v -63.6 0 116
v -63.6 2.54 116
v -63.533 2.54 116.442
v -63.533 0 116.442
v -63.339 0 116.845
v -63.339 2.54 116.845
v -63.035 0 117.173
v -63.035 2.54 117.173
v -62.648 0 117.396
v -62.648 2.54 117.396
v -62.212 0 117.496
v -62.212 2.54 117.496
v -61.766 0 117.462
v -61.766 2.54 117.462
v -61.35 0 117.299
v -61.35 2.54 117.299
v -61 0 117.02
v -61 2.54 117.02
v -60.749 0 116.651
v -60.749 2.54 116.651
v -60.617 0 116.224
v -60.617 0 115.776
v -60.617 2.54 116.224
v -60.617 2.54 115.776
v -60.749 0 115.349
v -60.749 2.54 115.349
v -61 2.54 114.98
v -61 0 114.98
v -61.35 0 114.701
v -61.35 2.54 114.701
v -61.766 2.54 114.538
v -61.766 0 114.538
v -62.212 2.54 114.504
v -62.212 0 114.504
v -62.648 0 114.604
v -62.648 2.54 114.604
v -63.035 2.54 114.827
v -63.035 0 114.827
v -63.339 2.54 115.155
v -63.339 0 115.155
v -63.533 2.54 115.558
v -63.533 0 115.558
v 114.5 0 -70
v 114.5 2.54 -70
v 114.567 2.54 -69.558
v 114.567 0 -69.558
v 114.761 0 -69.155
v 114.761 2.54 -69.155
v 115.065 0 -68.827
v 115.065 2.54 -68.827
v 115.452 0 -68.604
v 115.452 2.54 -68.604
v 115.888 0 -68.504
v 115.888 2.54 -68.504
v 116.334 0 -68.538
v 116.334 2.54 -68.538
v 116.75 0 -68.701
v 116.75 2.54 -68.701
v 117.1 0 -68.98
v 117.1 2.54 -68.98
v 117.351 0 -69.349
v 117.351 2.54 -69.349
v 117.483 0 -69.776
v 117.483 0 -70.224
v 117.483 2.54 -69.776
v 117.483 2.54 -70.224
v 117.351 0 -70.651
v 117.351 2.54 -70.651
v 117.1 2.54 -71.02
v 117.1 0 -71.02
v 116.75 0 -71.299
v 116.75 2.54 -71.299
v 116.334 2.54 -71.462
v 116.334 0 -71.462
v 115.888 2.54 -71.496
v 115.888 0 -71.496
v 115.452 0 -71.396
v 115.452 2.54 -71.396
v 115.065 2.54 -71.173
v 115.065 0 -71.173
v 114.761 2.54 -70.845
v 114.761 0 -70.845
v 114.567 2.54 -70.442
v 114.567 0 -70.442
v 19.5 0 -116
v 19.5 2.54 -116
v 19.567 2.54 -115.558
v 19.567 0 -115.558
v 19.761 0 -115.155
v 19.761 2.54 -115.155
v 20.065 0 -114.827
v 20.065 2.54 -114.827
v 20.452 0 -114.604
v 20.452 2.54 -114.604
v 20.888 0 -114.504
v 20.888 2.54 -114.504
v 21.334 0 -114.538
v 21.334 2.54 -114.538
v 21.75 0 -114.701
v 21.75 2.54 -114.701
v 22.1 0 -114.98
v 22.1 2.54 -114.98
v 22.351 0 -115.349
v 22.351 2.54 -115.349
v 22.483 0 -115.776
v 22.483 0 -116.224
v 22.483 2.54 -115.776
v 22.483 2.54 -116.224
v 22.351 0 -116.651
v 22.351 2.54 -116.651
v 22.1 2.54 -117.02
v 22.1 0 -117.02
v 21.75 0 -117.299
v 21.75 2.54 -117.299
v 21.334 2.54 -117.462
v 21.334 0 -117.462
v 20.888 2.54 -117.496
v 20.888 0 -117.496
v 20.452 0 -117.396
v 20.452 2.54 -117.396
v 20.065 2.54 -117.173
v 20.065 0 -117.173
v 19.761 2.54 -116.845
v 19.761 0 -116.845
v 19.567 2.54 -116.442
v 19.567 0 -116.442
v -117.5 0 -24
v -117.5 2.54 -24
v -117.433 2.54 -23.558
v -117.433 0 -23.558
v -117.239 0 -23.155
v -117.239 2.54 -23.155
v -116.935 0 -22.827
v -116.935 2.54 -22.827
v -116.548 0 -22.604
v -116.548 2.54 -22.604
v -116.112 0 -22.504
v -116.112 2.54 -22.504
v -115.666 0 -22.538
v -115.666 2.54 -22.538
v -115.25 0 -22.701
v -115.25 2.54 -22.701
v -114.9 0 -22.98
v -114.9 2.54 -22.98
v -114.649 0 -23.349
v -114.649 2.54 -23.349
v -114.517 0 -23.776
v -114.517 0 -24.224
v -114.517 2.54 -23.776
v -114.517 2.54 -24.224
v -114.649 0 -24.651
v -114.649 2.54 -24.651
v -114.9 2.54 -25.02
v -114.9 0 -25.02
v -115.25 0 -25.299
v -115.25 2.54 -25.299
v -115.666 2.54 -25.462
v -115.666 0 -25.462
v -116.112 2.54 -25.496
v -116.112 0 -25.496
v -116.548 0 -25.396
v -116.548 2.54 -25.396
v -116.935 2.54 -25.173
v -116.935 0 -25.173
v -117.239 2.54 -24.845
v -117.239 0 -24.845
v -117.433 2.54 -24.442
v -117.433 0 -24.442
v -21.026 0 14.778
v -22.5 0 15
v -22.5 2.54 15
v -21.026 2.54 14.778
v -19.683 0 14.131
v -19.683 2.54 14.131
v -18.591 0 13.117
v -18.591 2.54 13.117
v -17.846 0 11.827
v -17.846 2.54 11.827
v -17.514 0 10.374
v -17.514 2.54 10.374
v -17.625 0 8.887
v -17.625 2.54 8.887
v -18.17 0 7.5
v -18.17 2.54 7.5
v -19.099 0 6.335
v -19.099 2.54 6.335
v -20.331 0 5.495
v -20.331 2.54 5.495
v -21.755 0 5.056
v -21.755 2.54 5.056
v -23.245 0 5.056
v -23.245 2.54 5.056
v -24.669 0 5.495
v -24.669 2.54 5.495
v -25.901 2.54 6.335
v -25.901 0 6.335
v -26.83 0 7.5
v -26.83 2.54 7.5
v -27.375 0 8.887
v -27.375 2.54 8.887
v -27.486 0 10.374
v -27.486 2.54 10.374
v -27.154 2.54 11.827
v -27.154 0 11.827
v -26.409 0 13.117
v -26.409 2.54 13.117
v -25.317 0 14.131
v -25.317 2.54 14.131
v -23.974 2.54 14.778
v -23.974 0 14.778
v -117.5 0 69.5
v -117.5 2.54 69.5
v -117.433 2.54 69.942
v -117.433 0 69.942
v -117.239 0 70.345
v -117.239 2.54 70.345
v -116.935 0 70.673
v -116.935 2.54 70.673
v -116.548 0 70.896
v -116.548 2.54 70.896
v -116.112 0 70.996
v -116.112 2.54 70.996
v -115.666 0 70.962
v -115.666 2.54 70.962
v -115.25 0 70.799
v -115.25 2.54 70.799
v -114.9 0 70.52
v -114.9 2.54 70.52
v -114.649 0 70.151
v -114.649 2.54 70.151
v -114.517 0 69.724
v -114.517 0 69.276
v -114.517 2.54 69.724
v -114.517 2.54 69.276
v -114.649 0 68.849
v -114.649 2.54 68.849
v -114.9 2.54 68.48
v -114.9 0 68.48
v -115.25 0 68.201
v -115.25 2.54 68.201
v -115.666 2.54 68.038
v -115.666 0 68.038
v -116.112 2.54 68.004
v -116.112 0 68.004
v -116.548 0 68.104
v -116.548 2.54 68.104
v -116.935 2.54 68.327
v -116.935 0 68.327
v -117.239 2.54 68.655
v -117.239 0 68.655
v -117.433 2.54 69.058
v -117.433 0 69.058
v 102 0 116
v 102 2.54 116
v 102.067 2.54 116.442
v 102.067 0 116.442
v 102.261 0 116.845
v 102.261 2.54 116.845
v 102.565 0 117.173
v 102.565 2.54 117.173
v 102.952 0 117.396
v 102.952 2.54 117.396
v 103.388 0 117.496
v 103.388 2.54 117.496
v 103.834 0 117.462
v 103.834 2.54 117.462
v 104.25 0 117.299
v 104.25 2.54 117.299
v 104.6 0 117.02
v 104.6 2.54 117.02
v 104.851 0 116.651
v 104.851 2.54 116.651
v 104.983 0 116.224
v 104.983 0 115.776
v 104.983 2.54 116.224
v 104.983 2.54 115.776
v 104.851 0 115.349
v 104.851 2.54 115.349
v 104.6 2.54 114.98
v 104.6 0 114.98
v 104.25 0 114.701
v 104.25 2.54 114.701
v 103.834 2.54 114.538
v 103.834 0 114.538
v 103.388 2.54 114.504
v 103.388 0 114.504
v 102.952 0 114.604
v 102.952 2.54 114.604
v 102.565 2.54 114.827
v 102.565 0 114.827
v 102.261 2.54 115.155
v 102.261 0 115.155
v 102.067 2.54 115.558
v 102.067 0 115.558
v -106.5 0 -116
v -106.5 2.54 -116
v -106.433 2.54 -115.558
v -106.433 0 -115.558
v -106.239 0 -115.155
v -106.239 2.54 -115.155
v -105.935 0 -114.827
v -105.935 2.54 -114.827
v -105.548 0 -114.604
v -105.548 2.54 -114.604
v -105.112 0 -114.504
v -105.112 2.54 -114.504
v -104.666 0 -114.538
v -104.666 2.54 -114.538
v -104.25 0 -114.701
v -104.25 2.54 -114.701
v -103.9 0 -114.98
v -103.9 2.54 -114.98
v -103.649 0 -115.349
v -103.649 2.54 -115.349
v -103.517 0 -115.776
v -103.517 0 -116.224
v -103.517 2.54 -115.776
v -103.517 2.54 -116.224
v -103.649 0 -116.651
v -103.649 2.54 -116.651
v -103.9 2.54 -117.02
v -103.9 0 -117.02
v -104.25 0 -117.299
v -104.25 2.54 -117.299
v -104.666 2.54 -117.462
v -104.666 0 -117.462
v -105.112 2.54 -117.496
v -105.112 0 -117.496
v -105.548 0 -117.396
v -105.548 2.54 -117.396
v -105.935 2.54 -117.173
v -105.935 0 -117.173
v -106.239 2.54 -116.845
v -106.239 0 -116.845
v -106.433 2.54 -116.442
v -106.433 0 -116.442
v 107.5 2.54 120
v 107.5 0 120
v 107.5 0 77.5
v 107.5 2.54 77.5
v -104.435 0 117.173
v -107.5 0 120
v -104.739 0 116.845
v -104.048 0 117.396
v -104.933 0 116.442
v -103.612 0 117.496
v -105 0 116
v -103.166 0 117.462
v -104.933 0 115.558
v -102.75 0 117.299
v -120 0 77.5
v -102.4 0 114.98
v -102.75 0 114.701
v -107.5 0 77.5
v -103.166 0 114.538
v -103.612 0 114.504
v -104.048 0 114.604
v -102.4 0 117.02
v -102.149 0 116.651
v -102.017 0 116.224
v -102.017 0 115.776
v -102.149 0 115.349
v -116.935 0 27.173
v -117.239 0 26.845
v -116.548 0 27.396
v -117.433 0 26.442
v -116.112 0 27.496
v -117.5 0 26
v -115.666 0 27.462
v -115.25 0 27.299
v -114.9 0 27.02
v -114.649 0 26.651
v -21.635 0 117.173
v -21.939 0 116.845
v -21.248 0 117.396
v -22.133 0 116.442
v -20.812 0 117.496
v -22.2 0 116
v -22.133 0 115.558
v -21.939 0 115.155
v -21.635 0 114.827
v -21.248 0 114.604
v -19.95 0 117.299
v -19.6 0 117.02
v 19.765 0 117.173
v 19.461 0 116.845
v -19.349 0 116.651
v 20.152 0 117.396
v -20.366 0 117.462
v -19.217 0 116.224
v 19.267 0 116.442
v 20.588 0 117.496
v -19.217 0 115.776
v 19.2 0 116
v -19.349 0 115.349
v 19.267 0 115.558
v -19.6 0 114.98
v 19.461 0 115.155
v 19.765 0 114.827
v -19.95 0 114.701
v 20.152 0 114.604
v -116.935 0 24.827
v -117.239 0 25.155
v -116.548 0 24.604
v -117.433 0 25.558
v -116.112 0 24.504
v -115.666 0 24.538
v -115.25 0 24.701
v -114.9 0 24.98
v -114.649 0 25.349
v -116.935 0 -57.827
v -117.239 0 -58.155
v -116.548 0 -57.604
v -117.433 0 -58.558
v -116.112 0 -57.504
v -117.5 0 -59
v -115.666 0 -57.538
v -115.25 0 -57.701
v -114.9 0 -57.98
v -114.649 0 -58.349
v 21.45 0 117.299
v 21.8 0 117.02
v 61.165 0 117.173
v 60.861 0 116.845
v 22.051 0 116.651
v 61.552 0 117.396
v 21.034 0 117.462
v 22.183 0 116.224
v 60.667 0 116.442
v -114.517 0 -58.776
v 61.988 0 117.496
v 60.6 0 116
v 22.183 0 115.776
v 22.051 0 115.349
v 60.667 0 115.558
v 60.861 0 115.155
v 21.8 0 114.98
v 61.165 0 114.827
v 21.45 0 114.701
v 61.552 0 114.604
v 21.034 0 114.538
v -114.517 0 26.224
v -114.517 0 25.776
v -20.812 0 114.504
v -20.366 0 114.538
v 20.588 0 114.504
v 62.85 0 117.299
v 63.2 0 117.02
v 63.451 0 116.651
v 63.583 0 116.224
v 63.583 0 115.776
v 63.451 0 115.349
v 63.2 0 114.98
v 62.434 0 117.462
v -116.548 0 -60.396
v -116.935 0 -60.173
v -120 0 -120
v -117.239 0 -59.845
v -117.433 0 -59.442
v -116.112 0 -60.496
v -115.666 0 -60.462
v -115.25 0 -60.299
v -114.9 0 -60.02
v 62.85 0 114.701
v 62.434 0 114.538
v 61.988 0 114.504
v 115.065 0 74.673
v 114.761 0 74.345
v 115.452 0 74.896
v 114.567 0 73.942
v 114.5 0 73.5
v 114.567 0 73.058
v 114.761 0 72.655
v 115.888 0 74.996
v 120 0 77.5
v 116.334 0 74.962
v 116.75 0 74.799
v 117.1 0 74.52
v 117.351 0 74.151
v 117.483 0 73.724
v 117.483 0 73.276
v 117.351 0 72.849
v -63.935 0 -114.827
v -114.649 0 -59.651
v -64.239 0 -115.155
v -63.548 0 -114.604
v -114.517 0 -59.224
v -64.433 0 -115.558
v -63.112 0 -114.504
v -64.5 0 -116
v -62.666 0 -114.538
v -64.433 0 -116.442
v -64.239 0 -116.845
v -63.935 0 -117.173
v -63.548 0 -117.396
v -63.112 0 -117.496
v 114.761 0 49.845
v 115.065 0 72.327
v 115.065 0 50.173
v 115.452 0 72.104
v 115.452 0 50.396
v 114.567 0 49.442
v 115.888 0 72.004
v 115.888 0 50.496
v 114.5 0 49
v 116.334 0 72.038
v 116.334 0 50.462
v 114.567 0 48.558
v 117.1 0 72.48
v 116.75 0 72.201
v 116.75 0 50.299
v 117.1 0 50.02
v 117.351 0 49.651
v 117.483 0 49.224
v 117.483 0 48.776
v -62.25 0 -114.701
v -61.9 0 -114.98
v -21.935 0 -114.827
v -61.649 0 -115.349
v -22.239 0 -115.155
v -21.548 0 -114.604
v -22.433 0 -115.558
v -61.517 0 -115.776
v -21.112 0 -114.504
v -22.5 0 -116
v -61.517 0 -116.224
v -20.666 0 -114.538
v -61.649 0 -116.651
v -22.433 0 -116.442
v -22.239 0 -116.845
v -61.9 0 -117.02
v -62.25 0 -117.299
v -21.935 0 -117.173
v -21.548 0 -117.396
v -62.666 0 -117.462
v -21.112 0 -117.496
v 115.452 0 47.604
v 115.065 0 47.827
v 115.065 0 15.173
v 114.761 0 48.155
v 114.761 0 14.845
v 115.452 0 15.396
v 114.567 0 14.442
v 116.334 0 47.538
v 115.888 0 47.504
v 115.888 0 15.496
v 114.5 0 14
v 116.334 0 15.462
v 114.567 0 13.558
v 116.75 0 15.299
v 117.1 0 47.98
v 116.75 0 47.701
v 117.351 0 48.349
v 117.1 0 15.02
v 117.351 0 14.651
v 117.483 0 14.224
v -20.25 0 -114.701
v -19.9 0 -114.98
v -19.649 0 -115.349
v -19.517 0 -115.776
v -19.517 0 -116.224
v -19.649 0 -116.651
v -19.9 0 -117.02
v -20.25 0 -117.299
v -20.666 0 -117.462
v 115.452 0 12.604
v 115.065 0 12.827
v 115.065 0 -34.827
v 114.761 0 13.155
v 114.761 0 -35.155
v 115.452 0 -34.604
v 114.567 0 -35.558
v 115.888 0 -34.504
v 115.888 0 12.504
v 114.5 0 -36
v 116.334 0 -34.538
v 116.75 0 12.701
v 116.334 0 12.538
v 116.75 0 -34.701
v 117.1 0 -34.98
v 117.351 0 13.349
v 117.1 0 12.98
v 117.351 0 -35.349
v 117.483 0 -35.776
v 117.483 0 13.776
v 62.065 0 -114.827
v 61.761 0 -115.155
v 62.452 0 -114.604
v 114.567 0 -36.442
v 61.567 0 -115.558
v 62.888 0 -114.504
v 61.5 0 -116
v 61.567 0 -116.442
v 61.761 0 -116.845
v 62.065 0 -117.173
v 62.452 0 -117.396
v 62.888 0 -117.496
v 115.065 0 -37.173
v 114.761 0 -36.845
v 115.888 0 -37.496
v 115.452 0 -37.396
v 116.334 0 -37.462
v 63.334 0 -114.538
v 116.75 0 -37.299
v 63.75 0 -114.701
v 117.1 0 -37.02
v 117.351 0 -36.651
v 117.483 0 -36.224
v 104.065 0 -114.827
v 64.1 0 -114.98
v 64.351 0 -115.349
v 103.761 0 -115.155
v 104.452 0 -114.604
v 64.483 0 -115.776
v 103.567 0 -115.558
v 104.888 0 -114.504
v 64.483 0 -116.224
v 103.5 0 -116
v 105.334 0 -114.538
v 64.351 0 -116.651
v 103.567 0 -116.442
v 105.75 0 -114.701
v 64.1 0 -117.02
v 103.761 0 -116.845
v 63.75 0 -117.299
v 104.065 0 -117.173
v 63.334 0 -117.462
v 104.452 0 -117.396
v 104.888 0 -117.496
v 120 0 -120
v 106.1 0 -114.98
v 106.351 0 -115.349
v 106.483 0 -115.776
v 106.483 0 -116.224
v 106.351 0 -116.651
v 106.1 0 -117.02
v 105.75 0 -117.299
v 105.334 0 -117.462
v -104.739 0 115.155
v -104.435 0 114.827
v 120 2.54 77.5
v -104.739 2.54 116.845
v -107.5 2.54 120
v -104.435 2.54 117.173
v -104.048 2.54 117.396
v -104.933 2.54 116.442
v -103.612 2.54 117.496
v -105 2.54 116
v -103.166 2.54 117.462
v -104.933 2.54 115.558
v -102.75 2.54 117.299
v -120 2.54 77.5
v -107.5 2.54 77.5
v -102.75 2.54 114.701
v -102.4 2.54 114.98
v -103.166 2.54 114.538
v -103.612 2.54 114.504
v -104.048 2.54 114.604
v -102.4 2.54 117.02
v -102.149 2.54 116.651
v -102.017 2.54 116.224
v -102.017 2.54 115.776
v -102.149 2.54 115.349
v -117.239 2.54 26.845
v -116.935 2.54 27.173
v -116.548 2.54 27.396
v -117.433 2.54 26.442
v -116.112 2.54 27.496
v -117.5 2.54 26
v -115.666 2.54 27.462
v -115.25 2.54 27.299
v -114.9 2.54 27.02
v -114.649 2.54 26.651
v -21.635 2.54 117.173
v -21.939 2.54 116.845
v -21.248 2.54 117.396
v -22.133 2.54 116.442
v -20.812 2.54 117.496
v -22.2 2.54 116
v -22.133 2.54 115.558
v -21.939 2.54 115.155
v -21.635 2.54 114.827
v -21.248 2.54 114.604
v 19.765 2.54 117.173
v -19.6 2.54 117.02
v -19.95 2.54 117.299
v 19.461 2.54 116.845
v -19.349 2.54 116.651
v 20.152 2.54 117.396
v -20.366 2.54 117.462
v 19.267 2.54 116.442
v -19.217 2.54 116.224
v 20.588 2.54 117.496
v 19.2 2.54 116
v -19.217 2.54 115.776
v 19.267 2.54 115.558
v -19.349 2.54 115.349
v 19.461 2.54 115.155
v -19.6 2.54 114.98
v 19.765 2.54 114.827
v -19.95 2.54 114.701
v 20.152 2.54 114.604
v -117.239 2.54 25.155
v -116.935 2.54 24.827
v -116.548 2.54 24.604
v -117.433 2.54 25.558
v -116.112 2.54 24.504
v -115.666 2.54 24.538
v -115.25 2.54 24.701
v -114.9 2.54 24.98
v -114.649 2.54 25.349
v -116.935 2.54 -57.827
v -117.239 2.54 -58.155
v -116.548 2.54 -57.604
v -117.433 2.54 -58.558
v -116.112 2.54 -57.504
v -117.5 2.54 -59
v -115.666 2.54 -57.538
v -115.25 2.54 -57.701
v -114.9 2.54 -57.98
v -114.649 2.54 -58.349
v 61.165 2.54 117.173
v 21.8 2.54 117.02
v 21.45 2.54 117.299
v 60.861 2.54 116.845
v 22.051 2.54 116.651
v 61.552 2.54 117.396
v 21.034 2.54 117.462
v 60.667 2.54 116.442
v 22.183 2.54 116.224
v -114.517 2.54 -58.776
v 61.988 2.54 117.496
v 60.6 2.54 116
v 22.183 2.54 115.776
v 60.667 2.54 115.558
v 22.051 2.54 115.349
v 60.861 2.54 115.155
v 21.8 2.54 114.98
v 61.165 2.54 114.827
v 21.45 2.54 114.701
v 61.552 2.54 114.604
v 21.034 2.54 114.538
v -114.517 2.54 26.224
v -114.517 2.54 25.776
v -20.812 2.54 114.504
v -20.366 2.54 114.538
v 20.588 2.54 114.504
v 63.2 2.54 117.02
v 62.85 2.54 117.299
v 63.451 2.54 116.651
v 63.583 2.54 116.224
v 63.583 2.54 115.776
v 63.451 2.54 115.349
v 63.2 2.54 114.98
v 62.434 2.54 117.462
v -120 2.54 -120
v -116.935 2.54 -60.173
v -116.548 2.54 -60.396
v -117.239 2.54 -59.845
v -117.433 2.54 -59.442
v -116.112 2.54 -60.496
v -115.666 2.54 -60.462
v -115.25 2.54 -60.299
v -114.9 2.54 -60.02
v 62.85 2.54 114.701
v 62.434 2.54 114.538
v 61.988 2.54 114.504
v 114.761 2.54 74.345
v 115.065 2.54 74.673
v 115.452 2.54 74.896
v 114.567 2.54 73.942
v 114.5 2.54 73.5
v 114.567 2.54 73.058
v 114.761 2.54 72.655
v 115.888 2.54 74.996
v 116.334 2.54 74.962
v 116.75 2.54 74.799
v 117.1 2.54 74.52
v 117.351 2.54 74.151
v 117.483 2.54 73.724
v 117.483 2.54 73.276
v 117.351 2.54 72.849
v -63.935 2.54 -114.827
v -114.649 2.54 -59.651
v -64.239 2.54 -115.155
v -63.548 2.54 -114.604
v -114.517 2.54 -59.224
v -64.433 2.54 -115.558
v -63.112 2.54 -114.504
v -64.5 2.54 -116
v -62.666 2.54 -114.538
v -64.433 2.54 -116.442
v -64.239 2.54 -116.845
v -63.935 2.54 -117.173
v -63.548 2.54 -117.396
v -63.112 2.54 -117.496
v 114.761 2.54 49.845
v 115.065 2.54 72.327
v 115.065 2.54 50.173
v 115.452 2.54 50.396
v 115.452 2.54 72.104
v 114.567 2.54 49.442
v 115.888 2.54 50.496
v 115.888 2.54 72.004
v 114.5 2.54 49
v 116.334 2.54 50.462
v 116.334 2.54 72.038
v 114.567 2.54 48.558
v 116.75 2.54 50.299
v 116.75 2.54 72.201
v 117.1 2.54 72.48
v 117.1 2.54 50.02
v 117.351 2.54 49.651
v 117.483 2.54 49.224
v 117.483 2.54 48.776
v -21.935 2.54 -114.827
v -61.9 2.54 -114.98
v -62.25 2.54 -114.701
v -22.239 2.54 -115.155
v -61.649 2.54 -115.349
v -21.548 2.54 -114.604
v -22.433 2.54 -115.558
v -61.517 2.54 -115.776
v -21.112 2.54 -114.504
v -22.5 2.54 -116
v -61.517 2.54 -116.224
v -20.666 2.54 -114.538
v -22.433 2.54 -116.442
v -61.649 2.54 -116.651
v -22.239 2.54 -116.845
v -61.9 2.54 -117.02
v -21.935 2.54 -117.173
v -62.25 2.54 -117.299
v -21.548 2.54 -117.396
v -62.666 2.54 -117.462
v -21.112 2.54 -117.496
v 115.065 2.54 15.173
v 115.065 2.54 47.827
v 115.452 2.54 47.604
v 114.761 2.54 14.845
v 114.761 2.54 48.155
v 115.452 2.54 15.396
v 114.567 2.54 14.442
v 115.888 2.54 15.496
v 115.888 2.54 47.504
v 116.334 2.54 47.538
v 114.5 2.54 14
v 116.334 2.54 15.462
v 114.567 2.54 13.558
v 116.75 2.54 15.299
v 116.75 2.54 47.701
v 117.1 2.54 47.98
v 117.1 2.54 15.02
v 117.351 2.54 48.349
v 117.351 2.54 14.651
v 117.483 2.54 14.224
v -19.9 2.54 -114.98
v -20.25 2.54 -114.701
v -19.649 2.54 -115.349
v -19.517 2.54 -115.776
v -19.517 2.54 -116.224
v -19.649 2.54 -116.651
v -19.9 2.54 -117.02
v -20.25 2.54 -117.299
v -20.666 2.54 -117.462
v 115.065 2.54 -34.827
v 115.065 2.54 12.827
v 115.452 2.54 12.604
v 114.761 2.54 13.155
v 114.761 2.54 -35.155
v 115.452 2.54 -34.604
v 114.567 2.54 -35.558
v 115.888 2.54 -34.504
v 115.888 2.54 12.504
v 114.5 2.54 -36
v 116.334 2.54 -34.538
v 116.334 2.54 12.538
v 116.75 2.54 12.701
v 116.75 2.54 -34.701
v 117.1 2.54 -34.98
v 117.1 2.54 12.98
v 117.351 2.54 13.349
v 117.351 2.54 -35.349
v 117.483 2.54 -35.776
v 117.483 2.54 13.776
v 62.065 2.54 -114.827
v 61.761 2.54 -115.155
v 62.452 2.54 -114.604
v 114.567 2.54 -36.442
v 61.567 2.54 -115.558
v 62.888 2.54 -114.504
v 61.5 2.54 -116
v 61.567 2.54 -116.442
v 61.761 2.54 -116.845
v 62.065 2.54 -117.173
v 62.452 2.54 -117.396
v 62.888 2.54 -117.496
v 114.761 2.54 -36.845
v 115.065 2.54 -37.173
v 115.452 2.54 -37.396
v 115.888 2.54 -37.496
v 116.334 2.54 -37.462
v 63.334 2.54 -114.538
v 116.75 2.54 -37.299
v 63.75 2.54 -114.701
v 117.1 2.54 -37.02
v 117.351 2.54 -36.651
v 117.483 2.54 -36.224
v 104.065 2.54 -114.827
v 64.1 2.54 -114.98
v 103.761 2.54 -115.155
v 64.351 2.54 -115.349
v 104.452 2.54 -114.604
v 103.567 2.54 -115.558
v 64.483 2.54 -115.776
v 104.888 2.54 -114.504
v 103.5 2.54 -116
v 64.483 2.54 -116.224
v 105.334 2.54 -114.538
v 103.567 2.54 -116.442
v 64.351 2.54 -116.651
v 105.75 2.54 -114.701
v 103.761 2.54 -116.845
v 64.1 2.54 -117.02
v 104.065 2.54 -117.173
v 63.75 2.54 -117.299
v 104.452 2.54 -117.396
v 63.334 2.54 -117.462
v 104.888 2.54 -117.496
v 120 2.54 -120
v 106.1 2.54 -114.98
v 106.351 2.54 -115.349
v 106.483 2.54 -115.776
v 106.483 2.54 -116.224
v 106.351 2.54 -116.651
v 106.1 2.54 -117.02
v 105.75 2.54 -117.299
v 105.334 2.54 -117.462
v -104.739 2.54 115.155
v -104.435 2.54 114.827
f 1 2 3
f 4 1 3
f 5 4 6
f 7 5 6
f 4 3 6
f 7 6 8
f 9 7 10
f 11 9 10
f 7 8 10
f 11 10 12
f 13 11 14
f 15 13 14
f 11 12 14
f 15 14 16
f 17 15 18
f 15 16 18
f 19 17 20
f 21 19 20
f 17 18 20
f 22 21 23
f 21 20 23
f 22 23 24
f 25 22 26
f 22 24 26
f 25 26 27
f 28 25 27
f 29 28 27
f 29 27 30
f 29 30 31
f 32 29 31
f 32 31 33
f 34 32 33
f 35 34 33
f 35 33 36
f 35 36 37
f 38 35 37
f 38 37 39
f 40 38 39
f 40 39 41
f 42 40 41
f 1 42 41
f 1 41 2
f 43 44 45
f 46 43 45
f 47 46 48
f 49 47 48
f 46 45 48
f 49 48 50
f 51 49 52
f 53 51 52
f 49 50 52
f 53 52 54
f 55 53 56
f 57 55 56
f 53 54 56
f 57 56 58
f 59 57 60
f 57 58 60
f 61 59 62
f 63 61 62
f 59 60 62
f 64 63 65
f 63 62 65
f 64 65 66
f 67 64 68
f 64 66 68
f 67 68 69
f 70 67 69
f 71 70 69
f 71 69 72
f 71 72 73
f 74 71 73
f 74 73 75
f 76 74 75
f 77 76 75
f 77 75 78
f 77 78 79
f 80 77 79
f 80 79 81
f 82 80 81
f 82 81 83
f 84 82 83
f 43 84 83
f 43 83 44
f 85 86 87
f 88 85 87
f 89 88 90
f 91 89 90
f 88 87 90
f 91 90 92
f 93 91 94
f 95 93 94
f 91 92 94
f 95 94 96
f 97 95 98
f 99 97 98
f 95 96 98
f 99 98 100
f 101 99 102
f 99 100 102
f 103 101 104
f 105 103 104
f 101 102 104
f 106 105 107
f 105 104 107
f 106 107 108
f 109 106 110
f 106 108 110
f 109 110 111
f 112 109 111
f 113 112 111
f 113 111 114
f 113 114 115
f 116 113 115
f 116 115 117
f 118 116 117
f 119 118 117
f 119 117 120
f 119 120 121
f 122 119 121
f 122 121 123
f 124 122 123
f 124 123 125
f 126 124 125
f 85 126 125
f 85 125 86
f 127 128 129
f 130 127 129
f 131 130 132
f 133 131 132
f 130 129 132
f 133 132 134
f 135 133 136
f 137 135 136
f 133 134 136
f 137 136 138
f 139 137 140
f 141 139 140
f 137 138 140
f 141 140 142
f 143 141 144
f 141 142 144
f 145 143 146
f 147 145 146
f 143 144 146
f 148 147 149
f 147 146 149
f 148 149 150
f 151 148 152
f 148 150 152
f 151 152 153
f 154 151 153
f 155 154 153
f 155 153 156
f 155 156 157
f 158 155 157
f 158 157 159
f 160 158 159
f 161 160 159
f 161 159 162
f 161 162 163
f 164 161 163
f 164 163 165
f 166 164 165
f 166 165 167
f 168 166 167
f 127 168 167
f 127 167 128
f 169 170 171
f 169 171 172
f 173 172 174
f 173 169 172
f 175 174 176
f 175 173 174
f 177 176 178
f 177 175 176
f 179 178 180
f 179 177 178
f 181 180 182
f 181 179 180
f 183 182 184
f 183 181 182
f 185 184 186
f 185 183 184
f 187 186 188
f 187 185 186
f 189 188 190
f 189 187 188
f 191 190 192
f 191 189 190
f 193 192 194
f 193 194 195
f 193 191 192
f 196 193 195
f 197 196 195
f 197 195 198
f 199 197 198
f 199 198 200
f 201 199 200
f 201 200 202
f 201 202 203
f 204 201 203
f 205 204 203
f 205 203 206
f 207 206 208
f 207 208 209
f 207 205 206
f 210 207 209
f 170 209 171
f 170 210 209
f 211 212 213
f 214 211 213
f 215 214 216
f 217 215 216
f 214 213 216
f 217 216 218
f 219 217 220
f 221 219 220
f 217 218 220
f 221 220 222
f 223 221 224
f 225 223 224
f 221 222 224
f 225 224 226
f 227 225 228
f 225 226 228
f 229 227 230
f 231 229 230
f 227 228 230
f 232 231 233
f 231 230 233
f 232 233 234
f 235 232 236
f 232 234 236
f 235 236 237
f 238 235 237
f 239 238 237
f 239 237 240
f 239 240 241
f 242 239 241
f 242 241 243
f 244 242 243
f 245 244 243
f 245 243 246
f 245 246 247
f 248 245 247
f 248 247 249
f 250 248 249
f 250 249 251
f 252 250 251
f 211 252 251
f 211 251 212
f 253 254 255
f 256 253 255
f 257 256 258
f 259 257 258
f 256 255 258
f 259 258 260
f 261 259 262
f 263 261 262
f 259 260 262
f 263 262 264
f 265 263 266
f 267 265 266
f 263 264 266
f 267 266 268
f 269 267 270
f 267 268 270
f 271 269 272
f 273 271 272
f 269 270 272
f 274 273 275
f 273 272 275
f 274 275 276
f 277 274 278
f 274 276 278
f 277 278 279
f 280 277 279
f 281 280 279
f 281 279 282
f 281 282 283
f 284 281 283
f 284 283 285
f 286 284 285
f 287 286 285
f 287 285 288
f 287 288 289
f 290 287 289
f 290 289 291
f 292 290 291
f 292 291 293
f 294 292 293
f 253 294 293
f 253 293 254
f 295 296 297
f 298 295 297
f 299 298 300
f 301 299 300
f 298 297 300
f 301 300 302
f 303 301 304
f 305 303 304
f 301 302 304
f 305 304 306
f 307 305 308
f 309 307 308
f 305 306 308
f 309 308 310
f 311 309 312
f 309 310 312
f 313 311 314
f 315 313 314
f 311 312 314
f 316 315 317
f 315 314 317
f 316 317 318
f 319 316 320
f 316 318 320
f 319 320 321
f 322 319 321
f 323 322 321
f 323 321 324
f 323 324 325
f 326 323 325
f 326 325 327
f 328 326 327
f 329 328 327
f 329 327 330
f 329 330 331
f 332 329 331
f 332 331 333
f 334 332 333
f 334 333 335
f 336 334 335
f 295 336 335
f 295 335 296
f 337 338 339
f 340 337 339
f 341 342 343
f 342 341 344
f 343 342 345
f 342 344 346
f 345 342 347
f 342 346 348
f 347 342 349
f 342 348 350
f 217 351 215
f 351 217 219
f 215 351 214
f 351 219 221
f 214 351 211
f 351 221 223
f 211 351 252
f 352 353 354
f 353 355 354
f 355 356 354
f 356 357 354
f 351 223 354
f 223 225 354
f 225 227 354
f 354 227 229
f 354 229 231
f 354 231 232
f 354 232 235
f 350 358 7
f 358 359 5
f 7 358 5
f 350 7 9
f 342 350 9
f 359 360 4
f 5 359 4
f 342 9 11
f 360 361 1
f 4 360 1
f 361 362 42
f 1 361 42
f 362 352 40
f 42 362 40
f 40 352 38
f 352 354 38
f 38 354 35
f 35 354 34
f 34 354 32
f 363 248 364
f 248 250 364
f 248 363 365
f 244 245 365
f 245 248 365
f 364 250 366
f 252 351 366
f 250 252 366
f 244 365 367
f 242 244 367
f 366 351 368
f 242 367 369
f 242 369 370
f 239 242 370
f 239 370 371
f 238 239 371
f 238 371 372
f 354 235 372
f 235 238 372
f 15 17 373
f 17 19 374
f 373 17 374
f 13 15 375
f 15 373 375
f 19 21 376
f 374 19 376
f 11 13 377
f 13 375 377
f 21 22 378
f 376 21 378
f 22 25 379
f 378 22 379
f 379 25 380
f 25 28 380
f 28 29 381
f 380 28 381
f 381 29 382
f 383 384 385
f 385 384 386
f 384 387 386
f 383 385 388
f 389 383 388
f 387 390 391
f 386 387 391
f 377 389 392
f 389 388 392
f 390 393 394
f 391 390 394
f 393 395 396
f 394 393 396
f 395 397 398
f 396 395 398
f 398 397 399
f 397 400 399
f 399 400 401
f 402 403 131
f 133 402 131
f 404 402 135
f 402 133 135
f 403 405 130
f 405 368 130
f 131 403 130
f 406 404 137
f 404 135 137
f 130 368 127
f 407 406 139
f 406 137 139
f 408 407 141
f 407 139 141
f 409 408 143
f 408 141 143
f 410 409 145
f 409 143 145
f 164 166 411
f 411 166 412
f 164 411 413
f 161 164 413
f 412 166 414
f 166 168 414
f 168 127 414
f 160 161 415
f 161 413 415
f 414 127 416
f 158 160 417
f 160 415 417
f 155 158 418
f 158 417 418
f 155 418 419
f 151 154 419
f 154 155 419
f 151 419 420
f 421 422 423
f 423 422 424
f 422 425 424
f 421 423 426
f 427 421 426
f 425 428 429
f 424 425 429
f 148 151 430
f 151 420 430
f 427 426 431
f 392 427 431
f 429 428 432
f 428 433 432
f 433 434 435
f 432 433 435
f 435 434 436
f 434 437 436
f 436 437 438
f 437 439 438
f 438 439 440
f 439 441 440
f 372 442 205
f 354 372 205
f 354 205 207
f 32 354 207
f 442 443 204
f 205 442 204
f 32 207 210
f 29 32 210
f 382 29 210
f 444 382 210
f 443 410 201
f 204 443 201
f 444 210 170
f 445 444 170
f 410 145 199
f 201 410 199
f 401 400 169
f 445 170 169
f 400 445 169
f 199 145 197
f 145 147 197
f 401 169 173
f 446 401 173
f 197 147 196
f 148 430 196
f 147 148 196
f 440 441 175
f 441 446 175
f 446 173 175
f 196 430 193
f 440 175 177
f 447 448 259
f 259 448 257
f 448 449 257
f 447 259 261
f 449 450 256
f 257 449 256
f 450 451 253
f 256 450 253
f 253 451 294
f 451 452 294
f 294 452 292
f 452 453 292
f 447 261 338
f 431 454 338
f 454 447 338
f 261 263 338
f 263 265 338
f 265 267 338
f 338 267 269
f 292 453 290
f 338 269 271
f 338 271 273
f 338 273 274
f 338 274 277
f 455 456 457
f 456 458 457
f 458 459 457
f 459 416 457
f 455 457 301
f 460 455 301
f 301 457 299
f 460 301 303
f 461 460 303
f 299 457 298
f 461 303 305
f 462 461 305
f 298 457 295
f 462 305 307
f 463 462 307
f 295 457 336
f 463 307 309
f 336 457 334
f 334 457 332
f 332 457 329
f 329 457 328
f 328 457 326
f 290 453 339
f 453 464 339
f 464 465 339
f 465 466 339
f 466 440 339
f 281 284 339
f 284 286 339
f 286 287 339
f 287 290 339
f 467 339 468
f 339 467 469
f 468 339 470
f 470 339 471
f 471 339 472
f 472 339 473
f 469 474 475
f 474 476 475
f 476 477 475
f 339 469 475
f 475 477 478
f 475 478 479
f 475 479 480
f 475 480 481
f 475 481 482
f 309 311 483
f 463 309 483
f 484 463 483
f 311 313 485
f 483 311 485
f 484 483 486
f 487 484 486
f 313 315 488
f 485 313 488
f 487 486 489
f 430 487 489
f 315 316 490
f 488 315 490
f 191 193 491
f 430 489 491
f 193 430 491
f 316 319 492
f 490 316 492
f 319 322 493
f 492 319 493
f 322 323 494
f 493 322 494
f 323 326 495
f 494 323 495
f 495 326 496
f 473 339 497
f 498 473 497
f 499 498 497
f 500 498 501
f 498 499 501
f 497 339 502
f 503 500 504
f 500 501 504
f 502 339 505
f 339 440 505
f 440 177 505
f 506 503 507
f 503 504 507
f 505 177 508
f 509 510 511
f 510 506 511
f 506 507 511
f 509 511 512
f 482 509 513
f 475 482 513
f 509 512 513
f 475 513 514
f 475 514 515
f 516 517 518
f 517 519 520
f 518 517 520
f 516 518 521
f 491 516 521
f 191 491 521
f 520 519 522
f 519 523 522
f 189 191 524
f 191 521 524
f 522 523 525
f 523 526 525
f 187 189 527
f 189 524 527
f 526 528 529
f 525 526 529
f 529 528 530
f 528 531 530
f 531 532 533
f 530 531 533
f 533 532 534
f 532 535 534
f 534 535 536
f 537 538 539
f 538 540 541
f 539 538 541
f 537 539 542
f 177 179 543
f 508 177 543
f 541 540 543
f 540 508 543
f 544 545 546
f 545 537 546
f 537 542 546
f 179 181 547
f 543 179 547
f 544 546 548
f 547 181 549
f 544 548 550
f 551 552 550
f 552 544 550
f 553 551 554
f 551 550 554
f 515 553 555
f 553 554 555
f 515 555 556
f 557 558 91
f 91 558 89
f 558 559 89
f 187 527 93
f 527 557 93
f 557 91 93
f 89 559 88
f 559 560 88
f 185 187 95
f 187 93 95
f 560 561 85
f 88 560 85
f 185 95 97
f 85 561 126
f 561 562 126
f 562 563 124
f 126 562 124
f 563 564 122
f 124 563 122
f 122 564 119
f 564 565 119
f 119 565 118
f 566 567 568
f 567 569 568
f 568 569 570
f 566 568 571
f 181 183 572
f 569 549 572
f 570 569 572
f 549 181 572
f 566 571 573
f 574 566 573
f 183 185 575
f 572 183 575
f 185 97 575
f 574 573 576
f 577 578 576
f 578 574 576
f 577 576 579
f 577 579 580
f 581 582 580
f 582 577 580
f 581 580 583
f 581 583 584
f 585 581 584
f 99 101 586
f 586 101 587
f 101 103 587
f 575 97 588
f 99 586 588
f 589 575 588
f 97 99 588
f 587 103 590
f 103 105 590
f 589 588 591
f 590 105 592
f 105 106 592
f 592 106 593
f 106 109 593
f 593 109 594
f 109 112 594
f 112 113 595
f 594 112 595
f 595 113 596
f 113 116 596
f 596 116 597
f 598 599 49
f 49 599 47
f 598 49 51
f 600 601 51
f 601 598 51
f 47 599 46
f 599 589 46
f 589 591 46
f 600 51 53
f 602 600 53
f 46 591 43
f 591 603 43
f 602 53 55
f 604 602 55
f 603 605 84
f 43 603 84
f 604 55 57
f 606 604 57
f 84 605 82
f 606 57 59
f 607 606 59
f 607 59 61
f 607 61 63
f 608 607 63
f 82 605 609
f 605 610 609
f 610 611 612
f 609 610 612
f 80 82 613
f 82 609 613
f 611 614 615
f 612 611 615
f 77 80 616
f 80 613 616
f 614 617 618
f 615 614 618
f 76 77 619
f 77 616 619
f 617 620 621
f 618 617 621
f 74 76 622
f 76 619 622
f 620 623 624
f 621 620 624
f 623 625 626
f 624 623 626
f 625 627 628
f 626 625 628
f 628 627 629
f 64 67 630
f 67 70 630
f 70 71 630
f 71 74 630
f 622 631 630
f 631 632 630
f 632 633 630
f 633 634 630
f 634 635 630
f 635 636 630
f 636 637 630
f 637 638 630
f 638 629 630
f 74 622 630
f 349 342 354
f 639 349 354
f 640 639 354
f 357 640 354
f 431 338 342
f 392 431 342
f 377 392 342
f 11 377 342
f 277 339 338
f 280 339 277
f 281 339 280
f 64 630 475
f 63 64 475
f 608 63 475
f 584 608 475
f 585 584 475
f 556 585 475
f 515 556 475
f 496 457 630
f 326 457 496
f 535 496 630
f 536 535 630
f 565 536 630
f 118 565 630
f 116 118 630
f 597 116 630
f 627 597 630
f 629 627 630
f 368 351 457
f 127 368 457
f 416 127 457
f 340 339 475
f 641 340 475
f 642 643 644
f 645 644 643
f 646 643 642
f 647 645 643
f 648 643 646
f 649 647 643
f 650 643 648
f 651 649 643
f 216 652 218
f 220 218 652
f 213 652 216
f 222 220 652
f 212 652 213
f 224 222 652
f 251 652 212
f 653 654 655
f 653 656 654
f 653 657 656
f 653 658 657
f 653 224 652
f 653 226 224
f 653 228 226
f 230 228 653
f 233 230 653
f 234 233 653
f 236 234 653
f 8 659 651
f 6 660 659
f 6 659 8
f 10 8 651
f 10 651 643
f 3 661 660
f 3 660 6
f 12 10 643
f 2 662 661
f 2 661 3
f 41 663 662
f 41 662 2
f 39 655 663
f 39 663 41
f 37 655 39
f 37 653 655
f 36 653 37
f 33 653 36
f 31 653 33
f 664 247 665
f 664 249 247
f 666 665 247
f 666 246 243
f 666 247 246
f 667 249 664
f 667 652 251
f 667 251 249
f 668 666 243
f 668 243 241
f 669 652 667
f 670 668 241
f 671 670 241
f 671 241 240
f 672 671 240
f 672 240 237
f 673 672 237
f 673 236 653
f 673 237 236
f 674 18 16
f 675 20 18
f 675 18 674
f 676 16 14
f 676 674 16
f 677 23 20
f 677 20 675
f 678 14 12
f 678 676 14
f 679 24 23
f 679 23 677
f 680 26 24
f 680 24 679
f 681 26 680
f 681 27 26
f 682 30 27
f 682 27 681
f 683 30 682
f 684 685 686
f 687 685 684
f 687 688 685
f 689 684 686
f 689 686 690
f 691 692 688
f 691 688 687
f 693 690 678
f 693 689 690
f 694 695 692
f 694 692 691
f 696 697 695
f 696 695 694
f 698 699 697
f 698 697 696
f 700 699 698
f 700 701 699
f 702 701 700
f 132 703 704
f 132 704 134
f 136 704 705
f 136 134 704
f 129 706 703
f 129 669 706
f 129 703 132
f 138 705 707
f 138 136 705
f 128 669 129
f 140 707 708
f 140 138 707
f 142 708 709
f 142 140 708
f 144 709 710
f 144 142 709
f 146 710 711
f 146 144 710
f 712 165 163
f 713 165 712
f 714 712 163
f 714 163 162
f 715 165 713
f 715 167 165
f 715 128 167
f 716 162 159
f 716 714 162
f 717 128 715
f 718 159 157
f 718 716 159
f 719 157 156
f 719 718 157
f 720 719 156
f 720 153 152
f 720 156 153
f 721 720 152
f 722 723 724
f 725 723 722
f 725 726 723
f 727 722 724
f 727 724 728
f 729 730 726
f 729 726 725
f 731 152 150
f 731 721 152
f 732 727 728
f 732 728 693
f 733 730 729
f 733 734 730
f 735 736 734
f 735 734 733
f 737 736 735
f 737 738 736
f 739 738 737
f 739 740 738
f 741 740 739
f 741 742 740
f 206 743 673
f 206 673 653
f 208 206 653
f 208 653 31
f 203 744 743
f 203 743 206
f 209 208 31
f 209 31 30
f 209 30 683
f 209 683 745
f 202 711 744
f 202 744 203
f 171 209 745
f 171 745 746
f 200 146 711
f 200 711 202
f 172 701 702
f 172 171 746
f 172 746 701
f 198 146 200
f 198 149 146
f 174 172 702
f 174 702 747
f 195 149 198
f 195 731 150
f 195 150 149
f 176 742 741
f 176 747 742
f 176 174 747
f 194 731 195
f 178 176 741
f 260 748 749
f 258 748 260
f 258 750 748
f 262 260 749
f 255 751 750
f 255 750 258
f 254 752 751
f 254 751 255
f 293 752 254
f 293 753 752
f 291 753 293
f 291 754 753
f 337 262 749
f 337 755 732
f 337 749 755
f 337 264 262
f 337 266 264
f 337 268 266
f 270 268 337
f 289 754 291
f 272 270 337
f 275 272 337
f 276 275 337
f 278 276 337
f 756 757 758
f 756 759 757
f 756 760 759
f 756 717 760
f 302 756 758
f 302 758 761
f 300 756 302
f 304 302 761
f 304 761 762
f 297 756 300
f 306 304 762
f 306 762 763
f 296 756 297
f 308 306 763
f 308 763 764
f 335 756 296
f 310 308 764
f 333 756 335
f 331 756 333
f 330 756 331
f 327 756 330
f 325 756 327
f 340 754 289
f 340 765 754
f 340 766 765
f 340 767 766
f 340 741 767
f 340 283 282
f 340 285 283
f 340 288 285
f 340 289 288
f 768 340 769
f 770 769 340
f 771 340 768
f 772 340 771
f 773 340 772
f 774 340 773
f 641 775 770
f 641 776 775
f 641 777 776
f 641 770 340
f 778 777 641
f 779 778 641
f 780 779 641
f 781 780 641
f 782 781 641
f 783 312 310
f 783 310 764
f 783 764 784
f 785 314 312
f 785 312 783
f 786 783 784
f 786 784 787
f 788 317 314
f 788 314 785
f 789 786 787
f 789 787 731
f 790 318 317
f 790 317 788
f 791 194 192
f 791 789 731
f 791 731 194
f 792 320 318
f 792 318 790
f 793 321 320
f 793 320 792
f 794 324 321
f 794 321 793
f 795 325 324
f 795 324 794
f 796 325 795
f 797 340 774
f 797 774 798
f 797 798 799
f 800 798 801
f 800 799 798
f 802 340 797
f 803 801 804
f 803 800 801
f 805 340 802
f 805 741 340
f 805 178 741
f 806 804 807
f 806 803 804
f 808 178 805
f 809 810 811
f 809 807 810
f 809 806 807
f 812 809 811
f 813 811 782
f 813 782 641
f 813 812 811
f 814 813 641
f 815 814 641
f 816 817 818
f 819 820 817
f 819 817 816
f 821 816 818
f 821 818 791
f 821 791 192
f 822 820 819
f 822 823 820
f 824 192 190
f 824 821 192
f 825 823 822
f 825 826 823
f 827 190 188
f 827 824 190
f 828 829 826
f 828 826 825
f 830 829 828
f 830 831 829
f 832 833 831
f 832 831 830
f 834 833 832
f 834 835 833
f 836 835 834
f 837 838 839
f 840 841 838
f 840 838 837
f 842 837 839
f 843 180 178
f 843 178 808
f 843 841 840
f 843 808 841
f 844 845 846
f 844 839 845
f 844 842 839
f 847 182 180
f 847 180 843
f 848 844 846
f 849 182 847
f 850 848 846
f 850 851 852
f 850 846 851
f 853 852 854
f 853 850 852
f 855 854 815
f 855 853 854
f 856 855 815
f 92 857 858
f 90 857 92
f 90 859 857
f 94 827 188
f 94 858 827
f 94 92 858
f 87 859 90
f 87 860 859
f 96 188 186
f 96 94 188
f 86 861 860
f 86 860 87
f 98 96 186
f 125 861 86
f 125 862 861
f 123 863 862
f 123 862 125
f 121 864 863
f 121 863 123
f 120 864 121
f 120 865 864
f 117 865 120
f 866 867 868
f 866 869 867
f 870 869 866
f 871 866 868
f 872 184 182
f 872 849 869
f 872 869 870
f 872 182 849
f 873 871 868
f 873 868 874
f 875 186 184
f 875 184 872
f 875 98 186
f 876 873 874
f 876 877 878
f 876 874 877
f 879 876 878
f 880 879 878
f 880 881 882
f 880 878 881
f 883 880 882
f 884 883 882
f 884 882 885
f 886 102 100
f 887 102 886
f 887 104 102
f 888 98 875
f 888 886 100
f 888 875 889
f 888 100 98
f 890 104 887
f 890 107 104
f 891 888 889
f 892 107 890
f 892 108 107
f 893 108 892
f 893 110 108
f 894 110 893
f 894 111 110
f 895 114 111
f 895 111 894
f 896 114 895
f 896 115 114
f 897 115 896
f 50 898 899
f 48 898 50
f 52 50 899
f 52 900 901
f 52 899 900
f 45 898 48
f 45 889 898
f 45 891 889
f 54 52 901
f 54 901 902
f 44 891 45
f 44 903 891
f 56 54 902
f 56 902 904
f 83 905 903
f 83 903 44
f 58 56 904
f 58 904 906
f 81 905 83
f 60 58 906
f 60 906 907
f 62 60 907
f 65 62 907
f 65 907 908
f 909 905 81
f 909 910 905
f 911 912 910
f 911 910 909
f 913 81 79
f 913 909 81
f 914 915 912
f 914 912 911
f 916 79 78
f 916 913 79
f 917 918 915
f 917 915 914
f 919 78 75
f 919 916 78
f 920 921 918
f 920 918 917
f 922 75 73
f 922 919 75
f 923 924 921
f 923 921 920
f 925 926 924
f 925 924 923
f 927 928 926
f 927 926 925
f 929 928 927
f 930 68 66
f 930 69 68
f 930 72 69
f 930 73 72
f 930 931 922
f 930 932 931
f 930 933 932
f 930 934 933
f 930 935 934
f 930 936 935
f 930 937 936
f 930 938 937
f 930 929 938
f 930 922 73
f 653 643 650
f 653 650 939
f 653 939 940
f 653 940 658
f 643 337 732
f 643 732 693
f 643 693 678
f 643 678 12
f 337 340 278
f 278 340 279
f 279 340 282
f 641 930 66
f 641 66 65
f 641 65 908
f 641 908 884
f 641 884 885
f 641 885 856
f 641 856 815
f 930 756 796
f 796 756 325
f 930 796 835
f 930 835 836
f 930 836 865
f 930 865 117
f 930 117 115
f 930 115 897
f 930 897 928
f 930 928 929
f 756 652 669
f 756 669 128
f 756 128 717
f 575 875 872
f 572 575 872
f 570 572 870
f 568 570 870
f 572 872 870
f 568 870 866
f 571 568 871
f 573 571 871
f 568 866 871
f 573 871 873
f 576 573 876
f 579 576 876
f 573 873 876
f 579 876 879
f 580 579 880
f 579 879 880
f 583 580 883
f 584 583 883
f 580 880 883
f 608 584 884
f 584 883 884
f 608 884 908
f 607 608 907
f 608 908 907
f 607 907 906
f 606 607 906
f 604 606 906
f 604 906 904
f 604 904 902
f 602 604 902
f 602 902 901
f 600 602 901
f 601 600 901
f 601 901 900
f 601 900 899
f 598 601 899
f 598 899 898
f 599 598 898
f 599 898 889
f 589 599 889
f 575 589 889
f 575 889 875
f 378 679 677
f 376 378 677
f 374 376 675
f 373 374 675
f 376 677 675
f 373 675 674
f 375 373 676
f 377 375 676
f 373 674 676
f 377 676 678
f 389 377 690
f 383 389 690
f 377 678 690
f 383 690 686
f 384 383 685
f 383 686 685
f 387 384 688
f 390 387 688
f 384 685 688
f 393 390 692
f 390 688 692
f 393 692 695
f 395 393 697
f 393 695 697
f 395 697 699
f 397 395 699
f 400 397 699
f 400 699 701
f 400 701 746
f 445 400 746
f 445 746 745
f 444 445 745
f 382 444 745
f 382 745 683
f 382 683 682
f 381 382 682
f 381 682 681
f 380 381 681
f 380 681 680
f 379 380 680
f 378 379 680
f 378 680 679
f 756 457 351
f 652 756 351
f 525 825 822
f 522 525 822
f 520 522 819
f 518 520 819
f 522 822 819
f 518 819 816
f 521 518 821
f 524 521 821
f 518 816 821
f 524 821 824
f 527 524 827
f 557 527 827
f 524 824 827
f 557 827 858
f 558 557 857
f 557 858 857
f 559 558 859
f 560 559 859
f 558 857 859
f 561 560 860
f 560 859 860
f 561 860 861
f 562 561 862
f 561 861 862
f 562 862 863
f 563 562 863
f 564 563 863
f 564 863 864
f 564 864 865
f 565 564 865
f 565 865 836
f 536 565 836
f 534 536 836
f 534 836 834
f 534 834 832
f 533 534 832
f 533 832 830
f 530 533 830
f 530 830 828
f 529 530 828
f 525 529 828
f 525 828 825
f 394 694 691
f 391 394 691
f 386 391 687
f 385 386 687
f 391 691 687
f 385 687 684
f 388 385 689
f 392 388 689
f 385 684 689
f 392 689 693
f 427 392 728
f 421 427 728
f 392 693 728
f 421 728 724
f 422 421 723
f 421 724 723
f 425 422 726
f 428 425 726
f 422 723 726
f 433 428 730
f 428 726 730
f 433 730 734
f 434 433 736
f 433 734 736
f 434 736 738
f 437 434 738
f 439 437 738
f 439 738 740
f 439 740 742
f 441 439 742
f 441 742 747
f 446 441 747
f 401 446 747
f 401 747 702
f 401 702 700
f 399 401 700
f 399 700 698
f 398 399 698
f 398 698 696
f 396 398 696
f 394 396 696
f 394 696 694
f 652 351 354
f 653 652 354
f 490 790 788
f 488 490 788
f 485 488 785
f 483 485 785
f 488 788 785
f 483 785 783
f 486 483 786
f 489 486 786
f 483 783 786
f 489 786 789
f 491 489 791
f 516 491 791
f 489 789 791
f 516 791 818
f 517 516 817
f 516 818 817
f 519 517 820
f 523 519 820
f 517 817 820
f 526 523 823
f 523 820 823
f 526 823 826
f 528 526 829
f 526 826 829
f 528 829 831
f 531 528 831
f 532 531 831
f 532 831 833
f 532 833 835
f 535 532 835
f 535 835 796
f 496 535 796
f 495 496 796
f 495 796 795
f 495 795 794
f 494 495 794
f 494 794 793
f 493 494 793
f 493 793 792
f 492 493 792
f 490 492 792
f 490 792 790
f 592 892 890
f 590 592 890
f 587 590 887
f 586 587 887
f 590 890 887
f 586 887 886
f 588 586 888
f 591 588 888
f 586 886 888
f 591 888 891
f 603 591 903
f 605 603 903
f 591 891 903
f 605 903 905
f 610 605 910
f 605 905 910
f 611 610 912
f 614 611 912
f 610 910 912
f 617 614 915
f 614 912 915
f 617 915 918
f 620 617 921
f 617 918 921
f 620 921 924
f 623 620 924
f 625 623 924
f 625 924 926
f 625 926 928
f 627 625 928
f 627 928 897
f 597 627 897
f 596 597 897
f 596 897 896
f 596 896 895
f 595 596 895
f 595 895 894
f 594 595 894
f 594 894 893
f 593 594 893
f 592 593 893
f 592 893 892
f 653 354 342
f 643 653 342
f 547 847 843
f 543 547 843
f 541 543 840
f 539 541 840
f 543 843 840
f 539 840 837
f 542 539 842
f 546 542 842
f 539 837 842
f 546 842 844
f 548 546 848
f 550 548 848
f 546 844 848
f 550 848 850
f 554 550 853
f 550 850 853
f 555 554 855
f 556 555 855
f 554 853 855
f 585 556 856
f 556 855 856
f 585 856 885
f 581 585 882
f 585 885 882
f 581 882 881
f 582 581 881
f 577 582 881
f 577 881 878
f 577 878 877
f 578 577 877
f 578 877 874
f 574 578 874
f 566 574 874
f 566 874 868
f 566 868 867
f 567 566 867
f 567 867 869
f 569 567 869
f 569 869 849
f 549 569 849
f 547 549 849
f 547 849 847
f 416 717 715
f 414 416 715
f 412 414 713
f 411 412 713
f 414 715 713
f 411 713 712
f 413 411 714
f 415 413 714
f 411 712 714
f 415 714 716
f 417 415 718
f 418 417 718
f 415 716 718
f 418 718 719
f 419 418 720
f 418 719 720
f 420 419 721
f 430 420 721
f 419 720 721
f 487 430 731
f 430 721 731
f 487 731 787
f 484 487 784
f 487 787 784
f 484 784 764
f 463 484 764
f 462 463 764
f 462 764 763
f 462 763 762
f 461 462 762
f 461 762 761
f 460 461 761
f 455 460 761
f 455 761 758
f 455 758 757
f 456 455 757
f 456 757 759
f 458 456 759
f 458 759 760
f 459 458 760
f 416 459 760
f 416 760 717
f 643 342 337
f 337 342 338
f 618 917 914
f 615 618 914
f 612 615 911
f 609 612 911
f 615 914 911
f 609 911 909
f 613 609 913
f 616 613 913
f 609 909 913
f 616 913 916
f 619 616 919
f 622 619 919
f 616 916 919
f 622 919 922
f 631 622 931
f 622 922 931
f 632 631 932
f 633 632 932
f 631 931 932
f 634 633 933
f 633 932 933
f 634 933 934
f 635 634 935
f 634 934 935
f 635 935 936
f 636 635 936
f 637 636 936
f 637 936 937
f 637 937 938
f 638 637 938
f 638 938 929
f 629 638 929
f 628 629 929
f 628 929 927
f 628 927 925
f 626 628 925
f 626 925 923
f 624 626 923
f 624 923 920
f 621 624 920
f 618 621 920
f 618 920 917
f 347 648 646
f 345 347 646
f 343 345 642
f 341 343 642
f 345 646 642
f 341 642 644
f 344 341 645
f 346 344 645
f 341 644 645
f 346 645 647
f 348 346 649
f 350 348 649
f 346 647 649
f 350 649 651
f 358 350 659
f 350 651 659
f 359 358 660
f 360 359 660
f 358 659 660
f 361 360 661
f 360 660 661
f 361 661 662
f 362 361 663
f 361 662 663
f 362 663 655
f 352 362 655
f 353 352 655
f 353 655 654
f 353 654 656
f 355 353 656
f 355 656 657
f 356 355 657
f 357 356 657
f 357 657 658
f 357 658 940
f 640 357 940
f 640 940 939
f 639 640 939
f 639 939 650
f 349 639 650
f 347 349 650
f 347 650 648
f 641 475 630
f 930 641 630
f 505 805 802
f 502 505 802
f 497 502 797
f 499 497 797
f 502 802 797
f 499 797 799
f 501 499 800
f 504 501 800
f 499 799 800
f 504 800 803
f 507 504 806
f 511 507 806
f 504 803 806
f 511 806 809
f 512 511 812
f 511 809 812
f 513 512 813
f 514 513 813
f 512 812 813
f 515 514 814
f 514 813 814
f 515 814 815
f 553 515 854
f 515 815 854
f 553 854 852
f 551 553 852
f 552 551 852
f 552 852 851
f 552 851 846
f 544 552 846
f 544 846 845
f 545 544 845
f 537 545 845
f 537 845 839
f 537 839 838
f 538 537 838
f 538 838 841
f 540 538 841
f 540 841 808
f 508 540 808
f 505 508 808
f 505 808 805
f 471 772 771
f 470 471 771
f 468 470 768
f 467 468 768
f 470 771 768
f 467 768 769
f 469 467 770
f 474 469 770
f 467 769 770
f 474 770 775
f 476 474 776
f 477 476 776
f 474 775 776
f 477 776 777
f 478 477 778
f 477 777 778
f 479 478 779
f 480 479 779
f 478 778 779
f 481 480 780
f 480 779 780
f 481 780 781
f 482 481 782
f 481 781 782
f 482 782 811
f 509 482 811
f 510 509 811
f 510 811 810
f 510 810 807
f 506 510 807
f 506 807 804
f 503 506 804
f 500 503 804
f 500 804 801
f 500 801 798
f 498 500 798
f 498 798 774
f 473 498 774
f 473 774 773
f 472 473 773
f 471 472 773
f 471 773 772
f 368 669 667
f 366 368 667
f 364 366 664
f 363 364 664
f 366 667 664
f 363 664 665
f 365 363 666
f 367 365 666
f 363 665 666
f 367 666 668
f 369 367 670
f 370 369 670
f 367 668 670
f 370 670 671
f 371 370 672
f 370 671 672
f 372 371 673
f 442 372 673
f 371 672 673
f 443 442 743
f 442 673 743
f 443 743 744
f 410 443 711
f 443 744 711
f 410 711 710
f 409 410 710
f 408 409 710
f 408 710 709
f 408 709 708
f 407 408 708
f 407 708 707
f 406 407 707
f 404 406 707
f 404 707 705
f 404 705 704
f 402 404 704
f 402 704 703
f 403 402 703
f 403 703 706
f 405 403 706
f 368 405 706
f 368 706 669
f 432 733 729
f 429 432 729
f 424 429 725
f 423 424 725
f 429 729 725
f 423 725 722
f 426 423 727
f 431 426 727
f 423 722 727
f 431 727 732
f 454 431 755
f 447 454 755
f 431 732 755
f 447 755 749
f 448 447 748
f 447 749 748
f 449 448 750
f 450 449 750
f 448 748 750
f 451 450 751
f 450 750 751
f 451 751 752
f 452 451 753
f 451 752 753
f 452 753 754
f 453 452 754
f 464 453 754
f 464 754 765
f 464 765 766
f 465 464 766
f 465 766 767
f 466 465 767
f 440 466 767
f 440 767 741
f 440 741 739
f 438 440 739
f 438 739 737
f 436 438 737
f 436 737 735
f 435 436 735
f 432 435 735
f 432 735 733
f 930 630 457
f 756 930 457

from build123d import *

# Parameters (mm, degrees)
SKETCH1_R                = 5
BOSS_EXTRUDE1_DEPTH      = 2.54
F_3_0_3_DIAMETER_HOLE1_D = 3


with BuildPart() as part:
    # Sketch1 → Boss-Extrude1 (new body)
    with BuildSketch(Plane(origin=(0, 0, 0), x_dir=(1, 0, 0), z_dir=(0, 1, 0))):
        Polygon((-107.5, -77.5), (-107.5, -120), (107.5, -120), (107.5, -77.5), (120, -77.5), (120, 120), (-120, 120), (-120, -77.5), align=None)
        with Locations(Location((-22.5, -10, 0), (0, 0, 270))):
            Circle(SKETCH1_R, mode=Mode.SUBTRACT)
    extrude(amount=BOSS_EXTRUDE1_DEPTH)

    # Ø3.0 (3) Diameter Hole1 (through all)
    with Locations(Plane.XZ):
        with Locations((-103.5, 116), (-62.1, 116), (-20.7, 116), (20.7, 116), (62.1, 116), (103.5, 116), (116, 73.5), (116, 49), (116, 14), (116, -36), (116, -70), (105, -116), (63, -116), (21, -116), (-21, -116), (-63, -116), (-105, -116), (-116, -59), (-116, -24), (-116, 26), (-116, 69.5)):
            Hole(F_3_0_3_DIAMETER_HOLE1_D / 2)


solid = part.part
